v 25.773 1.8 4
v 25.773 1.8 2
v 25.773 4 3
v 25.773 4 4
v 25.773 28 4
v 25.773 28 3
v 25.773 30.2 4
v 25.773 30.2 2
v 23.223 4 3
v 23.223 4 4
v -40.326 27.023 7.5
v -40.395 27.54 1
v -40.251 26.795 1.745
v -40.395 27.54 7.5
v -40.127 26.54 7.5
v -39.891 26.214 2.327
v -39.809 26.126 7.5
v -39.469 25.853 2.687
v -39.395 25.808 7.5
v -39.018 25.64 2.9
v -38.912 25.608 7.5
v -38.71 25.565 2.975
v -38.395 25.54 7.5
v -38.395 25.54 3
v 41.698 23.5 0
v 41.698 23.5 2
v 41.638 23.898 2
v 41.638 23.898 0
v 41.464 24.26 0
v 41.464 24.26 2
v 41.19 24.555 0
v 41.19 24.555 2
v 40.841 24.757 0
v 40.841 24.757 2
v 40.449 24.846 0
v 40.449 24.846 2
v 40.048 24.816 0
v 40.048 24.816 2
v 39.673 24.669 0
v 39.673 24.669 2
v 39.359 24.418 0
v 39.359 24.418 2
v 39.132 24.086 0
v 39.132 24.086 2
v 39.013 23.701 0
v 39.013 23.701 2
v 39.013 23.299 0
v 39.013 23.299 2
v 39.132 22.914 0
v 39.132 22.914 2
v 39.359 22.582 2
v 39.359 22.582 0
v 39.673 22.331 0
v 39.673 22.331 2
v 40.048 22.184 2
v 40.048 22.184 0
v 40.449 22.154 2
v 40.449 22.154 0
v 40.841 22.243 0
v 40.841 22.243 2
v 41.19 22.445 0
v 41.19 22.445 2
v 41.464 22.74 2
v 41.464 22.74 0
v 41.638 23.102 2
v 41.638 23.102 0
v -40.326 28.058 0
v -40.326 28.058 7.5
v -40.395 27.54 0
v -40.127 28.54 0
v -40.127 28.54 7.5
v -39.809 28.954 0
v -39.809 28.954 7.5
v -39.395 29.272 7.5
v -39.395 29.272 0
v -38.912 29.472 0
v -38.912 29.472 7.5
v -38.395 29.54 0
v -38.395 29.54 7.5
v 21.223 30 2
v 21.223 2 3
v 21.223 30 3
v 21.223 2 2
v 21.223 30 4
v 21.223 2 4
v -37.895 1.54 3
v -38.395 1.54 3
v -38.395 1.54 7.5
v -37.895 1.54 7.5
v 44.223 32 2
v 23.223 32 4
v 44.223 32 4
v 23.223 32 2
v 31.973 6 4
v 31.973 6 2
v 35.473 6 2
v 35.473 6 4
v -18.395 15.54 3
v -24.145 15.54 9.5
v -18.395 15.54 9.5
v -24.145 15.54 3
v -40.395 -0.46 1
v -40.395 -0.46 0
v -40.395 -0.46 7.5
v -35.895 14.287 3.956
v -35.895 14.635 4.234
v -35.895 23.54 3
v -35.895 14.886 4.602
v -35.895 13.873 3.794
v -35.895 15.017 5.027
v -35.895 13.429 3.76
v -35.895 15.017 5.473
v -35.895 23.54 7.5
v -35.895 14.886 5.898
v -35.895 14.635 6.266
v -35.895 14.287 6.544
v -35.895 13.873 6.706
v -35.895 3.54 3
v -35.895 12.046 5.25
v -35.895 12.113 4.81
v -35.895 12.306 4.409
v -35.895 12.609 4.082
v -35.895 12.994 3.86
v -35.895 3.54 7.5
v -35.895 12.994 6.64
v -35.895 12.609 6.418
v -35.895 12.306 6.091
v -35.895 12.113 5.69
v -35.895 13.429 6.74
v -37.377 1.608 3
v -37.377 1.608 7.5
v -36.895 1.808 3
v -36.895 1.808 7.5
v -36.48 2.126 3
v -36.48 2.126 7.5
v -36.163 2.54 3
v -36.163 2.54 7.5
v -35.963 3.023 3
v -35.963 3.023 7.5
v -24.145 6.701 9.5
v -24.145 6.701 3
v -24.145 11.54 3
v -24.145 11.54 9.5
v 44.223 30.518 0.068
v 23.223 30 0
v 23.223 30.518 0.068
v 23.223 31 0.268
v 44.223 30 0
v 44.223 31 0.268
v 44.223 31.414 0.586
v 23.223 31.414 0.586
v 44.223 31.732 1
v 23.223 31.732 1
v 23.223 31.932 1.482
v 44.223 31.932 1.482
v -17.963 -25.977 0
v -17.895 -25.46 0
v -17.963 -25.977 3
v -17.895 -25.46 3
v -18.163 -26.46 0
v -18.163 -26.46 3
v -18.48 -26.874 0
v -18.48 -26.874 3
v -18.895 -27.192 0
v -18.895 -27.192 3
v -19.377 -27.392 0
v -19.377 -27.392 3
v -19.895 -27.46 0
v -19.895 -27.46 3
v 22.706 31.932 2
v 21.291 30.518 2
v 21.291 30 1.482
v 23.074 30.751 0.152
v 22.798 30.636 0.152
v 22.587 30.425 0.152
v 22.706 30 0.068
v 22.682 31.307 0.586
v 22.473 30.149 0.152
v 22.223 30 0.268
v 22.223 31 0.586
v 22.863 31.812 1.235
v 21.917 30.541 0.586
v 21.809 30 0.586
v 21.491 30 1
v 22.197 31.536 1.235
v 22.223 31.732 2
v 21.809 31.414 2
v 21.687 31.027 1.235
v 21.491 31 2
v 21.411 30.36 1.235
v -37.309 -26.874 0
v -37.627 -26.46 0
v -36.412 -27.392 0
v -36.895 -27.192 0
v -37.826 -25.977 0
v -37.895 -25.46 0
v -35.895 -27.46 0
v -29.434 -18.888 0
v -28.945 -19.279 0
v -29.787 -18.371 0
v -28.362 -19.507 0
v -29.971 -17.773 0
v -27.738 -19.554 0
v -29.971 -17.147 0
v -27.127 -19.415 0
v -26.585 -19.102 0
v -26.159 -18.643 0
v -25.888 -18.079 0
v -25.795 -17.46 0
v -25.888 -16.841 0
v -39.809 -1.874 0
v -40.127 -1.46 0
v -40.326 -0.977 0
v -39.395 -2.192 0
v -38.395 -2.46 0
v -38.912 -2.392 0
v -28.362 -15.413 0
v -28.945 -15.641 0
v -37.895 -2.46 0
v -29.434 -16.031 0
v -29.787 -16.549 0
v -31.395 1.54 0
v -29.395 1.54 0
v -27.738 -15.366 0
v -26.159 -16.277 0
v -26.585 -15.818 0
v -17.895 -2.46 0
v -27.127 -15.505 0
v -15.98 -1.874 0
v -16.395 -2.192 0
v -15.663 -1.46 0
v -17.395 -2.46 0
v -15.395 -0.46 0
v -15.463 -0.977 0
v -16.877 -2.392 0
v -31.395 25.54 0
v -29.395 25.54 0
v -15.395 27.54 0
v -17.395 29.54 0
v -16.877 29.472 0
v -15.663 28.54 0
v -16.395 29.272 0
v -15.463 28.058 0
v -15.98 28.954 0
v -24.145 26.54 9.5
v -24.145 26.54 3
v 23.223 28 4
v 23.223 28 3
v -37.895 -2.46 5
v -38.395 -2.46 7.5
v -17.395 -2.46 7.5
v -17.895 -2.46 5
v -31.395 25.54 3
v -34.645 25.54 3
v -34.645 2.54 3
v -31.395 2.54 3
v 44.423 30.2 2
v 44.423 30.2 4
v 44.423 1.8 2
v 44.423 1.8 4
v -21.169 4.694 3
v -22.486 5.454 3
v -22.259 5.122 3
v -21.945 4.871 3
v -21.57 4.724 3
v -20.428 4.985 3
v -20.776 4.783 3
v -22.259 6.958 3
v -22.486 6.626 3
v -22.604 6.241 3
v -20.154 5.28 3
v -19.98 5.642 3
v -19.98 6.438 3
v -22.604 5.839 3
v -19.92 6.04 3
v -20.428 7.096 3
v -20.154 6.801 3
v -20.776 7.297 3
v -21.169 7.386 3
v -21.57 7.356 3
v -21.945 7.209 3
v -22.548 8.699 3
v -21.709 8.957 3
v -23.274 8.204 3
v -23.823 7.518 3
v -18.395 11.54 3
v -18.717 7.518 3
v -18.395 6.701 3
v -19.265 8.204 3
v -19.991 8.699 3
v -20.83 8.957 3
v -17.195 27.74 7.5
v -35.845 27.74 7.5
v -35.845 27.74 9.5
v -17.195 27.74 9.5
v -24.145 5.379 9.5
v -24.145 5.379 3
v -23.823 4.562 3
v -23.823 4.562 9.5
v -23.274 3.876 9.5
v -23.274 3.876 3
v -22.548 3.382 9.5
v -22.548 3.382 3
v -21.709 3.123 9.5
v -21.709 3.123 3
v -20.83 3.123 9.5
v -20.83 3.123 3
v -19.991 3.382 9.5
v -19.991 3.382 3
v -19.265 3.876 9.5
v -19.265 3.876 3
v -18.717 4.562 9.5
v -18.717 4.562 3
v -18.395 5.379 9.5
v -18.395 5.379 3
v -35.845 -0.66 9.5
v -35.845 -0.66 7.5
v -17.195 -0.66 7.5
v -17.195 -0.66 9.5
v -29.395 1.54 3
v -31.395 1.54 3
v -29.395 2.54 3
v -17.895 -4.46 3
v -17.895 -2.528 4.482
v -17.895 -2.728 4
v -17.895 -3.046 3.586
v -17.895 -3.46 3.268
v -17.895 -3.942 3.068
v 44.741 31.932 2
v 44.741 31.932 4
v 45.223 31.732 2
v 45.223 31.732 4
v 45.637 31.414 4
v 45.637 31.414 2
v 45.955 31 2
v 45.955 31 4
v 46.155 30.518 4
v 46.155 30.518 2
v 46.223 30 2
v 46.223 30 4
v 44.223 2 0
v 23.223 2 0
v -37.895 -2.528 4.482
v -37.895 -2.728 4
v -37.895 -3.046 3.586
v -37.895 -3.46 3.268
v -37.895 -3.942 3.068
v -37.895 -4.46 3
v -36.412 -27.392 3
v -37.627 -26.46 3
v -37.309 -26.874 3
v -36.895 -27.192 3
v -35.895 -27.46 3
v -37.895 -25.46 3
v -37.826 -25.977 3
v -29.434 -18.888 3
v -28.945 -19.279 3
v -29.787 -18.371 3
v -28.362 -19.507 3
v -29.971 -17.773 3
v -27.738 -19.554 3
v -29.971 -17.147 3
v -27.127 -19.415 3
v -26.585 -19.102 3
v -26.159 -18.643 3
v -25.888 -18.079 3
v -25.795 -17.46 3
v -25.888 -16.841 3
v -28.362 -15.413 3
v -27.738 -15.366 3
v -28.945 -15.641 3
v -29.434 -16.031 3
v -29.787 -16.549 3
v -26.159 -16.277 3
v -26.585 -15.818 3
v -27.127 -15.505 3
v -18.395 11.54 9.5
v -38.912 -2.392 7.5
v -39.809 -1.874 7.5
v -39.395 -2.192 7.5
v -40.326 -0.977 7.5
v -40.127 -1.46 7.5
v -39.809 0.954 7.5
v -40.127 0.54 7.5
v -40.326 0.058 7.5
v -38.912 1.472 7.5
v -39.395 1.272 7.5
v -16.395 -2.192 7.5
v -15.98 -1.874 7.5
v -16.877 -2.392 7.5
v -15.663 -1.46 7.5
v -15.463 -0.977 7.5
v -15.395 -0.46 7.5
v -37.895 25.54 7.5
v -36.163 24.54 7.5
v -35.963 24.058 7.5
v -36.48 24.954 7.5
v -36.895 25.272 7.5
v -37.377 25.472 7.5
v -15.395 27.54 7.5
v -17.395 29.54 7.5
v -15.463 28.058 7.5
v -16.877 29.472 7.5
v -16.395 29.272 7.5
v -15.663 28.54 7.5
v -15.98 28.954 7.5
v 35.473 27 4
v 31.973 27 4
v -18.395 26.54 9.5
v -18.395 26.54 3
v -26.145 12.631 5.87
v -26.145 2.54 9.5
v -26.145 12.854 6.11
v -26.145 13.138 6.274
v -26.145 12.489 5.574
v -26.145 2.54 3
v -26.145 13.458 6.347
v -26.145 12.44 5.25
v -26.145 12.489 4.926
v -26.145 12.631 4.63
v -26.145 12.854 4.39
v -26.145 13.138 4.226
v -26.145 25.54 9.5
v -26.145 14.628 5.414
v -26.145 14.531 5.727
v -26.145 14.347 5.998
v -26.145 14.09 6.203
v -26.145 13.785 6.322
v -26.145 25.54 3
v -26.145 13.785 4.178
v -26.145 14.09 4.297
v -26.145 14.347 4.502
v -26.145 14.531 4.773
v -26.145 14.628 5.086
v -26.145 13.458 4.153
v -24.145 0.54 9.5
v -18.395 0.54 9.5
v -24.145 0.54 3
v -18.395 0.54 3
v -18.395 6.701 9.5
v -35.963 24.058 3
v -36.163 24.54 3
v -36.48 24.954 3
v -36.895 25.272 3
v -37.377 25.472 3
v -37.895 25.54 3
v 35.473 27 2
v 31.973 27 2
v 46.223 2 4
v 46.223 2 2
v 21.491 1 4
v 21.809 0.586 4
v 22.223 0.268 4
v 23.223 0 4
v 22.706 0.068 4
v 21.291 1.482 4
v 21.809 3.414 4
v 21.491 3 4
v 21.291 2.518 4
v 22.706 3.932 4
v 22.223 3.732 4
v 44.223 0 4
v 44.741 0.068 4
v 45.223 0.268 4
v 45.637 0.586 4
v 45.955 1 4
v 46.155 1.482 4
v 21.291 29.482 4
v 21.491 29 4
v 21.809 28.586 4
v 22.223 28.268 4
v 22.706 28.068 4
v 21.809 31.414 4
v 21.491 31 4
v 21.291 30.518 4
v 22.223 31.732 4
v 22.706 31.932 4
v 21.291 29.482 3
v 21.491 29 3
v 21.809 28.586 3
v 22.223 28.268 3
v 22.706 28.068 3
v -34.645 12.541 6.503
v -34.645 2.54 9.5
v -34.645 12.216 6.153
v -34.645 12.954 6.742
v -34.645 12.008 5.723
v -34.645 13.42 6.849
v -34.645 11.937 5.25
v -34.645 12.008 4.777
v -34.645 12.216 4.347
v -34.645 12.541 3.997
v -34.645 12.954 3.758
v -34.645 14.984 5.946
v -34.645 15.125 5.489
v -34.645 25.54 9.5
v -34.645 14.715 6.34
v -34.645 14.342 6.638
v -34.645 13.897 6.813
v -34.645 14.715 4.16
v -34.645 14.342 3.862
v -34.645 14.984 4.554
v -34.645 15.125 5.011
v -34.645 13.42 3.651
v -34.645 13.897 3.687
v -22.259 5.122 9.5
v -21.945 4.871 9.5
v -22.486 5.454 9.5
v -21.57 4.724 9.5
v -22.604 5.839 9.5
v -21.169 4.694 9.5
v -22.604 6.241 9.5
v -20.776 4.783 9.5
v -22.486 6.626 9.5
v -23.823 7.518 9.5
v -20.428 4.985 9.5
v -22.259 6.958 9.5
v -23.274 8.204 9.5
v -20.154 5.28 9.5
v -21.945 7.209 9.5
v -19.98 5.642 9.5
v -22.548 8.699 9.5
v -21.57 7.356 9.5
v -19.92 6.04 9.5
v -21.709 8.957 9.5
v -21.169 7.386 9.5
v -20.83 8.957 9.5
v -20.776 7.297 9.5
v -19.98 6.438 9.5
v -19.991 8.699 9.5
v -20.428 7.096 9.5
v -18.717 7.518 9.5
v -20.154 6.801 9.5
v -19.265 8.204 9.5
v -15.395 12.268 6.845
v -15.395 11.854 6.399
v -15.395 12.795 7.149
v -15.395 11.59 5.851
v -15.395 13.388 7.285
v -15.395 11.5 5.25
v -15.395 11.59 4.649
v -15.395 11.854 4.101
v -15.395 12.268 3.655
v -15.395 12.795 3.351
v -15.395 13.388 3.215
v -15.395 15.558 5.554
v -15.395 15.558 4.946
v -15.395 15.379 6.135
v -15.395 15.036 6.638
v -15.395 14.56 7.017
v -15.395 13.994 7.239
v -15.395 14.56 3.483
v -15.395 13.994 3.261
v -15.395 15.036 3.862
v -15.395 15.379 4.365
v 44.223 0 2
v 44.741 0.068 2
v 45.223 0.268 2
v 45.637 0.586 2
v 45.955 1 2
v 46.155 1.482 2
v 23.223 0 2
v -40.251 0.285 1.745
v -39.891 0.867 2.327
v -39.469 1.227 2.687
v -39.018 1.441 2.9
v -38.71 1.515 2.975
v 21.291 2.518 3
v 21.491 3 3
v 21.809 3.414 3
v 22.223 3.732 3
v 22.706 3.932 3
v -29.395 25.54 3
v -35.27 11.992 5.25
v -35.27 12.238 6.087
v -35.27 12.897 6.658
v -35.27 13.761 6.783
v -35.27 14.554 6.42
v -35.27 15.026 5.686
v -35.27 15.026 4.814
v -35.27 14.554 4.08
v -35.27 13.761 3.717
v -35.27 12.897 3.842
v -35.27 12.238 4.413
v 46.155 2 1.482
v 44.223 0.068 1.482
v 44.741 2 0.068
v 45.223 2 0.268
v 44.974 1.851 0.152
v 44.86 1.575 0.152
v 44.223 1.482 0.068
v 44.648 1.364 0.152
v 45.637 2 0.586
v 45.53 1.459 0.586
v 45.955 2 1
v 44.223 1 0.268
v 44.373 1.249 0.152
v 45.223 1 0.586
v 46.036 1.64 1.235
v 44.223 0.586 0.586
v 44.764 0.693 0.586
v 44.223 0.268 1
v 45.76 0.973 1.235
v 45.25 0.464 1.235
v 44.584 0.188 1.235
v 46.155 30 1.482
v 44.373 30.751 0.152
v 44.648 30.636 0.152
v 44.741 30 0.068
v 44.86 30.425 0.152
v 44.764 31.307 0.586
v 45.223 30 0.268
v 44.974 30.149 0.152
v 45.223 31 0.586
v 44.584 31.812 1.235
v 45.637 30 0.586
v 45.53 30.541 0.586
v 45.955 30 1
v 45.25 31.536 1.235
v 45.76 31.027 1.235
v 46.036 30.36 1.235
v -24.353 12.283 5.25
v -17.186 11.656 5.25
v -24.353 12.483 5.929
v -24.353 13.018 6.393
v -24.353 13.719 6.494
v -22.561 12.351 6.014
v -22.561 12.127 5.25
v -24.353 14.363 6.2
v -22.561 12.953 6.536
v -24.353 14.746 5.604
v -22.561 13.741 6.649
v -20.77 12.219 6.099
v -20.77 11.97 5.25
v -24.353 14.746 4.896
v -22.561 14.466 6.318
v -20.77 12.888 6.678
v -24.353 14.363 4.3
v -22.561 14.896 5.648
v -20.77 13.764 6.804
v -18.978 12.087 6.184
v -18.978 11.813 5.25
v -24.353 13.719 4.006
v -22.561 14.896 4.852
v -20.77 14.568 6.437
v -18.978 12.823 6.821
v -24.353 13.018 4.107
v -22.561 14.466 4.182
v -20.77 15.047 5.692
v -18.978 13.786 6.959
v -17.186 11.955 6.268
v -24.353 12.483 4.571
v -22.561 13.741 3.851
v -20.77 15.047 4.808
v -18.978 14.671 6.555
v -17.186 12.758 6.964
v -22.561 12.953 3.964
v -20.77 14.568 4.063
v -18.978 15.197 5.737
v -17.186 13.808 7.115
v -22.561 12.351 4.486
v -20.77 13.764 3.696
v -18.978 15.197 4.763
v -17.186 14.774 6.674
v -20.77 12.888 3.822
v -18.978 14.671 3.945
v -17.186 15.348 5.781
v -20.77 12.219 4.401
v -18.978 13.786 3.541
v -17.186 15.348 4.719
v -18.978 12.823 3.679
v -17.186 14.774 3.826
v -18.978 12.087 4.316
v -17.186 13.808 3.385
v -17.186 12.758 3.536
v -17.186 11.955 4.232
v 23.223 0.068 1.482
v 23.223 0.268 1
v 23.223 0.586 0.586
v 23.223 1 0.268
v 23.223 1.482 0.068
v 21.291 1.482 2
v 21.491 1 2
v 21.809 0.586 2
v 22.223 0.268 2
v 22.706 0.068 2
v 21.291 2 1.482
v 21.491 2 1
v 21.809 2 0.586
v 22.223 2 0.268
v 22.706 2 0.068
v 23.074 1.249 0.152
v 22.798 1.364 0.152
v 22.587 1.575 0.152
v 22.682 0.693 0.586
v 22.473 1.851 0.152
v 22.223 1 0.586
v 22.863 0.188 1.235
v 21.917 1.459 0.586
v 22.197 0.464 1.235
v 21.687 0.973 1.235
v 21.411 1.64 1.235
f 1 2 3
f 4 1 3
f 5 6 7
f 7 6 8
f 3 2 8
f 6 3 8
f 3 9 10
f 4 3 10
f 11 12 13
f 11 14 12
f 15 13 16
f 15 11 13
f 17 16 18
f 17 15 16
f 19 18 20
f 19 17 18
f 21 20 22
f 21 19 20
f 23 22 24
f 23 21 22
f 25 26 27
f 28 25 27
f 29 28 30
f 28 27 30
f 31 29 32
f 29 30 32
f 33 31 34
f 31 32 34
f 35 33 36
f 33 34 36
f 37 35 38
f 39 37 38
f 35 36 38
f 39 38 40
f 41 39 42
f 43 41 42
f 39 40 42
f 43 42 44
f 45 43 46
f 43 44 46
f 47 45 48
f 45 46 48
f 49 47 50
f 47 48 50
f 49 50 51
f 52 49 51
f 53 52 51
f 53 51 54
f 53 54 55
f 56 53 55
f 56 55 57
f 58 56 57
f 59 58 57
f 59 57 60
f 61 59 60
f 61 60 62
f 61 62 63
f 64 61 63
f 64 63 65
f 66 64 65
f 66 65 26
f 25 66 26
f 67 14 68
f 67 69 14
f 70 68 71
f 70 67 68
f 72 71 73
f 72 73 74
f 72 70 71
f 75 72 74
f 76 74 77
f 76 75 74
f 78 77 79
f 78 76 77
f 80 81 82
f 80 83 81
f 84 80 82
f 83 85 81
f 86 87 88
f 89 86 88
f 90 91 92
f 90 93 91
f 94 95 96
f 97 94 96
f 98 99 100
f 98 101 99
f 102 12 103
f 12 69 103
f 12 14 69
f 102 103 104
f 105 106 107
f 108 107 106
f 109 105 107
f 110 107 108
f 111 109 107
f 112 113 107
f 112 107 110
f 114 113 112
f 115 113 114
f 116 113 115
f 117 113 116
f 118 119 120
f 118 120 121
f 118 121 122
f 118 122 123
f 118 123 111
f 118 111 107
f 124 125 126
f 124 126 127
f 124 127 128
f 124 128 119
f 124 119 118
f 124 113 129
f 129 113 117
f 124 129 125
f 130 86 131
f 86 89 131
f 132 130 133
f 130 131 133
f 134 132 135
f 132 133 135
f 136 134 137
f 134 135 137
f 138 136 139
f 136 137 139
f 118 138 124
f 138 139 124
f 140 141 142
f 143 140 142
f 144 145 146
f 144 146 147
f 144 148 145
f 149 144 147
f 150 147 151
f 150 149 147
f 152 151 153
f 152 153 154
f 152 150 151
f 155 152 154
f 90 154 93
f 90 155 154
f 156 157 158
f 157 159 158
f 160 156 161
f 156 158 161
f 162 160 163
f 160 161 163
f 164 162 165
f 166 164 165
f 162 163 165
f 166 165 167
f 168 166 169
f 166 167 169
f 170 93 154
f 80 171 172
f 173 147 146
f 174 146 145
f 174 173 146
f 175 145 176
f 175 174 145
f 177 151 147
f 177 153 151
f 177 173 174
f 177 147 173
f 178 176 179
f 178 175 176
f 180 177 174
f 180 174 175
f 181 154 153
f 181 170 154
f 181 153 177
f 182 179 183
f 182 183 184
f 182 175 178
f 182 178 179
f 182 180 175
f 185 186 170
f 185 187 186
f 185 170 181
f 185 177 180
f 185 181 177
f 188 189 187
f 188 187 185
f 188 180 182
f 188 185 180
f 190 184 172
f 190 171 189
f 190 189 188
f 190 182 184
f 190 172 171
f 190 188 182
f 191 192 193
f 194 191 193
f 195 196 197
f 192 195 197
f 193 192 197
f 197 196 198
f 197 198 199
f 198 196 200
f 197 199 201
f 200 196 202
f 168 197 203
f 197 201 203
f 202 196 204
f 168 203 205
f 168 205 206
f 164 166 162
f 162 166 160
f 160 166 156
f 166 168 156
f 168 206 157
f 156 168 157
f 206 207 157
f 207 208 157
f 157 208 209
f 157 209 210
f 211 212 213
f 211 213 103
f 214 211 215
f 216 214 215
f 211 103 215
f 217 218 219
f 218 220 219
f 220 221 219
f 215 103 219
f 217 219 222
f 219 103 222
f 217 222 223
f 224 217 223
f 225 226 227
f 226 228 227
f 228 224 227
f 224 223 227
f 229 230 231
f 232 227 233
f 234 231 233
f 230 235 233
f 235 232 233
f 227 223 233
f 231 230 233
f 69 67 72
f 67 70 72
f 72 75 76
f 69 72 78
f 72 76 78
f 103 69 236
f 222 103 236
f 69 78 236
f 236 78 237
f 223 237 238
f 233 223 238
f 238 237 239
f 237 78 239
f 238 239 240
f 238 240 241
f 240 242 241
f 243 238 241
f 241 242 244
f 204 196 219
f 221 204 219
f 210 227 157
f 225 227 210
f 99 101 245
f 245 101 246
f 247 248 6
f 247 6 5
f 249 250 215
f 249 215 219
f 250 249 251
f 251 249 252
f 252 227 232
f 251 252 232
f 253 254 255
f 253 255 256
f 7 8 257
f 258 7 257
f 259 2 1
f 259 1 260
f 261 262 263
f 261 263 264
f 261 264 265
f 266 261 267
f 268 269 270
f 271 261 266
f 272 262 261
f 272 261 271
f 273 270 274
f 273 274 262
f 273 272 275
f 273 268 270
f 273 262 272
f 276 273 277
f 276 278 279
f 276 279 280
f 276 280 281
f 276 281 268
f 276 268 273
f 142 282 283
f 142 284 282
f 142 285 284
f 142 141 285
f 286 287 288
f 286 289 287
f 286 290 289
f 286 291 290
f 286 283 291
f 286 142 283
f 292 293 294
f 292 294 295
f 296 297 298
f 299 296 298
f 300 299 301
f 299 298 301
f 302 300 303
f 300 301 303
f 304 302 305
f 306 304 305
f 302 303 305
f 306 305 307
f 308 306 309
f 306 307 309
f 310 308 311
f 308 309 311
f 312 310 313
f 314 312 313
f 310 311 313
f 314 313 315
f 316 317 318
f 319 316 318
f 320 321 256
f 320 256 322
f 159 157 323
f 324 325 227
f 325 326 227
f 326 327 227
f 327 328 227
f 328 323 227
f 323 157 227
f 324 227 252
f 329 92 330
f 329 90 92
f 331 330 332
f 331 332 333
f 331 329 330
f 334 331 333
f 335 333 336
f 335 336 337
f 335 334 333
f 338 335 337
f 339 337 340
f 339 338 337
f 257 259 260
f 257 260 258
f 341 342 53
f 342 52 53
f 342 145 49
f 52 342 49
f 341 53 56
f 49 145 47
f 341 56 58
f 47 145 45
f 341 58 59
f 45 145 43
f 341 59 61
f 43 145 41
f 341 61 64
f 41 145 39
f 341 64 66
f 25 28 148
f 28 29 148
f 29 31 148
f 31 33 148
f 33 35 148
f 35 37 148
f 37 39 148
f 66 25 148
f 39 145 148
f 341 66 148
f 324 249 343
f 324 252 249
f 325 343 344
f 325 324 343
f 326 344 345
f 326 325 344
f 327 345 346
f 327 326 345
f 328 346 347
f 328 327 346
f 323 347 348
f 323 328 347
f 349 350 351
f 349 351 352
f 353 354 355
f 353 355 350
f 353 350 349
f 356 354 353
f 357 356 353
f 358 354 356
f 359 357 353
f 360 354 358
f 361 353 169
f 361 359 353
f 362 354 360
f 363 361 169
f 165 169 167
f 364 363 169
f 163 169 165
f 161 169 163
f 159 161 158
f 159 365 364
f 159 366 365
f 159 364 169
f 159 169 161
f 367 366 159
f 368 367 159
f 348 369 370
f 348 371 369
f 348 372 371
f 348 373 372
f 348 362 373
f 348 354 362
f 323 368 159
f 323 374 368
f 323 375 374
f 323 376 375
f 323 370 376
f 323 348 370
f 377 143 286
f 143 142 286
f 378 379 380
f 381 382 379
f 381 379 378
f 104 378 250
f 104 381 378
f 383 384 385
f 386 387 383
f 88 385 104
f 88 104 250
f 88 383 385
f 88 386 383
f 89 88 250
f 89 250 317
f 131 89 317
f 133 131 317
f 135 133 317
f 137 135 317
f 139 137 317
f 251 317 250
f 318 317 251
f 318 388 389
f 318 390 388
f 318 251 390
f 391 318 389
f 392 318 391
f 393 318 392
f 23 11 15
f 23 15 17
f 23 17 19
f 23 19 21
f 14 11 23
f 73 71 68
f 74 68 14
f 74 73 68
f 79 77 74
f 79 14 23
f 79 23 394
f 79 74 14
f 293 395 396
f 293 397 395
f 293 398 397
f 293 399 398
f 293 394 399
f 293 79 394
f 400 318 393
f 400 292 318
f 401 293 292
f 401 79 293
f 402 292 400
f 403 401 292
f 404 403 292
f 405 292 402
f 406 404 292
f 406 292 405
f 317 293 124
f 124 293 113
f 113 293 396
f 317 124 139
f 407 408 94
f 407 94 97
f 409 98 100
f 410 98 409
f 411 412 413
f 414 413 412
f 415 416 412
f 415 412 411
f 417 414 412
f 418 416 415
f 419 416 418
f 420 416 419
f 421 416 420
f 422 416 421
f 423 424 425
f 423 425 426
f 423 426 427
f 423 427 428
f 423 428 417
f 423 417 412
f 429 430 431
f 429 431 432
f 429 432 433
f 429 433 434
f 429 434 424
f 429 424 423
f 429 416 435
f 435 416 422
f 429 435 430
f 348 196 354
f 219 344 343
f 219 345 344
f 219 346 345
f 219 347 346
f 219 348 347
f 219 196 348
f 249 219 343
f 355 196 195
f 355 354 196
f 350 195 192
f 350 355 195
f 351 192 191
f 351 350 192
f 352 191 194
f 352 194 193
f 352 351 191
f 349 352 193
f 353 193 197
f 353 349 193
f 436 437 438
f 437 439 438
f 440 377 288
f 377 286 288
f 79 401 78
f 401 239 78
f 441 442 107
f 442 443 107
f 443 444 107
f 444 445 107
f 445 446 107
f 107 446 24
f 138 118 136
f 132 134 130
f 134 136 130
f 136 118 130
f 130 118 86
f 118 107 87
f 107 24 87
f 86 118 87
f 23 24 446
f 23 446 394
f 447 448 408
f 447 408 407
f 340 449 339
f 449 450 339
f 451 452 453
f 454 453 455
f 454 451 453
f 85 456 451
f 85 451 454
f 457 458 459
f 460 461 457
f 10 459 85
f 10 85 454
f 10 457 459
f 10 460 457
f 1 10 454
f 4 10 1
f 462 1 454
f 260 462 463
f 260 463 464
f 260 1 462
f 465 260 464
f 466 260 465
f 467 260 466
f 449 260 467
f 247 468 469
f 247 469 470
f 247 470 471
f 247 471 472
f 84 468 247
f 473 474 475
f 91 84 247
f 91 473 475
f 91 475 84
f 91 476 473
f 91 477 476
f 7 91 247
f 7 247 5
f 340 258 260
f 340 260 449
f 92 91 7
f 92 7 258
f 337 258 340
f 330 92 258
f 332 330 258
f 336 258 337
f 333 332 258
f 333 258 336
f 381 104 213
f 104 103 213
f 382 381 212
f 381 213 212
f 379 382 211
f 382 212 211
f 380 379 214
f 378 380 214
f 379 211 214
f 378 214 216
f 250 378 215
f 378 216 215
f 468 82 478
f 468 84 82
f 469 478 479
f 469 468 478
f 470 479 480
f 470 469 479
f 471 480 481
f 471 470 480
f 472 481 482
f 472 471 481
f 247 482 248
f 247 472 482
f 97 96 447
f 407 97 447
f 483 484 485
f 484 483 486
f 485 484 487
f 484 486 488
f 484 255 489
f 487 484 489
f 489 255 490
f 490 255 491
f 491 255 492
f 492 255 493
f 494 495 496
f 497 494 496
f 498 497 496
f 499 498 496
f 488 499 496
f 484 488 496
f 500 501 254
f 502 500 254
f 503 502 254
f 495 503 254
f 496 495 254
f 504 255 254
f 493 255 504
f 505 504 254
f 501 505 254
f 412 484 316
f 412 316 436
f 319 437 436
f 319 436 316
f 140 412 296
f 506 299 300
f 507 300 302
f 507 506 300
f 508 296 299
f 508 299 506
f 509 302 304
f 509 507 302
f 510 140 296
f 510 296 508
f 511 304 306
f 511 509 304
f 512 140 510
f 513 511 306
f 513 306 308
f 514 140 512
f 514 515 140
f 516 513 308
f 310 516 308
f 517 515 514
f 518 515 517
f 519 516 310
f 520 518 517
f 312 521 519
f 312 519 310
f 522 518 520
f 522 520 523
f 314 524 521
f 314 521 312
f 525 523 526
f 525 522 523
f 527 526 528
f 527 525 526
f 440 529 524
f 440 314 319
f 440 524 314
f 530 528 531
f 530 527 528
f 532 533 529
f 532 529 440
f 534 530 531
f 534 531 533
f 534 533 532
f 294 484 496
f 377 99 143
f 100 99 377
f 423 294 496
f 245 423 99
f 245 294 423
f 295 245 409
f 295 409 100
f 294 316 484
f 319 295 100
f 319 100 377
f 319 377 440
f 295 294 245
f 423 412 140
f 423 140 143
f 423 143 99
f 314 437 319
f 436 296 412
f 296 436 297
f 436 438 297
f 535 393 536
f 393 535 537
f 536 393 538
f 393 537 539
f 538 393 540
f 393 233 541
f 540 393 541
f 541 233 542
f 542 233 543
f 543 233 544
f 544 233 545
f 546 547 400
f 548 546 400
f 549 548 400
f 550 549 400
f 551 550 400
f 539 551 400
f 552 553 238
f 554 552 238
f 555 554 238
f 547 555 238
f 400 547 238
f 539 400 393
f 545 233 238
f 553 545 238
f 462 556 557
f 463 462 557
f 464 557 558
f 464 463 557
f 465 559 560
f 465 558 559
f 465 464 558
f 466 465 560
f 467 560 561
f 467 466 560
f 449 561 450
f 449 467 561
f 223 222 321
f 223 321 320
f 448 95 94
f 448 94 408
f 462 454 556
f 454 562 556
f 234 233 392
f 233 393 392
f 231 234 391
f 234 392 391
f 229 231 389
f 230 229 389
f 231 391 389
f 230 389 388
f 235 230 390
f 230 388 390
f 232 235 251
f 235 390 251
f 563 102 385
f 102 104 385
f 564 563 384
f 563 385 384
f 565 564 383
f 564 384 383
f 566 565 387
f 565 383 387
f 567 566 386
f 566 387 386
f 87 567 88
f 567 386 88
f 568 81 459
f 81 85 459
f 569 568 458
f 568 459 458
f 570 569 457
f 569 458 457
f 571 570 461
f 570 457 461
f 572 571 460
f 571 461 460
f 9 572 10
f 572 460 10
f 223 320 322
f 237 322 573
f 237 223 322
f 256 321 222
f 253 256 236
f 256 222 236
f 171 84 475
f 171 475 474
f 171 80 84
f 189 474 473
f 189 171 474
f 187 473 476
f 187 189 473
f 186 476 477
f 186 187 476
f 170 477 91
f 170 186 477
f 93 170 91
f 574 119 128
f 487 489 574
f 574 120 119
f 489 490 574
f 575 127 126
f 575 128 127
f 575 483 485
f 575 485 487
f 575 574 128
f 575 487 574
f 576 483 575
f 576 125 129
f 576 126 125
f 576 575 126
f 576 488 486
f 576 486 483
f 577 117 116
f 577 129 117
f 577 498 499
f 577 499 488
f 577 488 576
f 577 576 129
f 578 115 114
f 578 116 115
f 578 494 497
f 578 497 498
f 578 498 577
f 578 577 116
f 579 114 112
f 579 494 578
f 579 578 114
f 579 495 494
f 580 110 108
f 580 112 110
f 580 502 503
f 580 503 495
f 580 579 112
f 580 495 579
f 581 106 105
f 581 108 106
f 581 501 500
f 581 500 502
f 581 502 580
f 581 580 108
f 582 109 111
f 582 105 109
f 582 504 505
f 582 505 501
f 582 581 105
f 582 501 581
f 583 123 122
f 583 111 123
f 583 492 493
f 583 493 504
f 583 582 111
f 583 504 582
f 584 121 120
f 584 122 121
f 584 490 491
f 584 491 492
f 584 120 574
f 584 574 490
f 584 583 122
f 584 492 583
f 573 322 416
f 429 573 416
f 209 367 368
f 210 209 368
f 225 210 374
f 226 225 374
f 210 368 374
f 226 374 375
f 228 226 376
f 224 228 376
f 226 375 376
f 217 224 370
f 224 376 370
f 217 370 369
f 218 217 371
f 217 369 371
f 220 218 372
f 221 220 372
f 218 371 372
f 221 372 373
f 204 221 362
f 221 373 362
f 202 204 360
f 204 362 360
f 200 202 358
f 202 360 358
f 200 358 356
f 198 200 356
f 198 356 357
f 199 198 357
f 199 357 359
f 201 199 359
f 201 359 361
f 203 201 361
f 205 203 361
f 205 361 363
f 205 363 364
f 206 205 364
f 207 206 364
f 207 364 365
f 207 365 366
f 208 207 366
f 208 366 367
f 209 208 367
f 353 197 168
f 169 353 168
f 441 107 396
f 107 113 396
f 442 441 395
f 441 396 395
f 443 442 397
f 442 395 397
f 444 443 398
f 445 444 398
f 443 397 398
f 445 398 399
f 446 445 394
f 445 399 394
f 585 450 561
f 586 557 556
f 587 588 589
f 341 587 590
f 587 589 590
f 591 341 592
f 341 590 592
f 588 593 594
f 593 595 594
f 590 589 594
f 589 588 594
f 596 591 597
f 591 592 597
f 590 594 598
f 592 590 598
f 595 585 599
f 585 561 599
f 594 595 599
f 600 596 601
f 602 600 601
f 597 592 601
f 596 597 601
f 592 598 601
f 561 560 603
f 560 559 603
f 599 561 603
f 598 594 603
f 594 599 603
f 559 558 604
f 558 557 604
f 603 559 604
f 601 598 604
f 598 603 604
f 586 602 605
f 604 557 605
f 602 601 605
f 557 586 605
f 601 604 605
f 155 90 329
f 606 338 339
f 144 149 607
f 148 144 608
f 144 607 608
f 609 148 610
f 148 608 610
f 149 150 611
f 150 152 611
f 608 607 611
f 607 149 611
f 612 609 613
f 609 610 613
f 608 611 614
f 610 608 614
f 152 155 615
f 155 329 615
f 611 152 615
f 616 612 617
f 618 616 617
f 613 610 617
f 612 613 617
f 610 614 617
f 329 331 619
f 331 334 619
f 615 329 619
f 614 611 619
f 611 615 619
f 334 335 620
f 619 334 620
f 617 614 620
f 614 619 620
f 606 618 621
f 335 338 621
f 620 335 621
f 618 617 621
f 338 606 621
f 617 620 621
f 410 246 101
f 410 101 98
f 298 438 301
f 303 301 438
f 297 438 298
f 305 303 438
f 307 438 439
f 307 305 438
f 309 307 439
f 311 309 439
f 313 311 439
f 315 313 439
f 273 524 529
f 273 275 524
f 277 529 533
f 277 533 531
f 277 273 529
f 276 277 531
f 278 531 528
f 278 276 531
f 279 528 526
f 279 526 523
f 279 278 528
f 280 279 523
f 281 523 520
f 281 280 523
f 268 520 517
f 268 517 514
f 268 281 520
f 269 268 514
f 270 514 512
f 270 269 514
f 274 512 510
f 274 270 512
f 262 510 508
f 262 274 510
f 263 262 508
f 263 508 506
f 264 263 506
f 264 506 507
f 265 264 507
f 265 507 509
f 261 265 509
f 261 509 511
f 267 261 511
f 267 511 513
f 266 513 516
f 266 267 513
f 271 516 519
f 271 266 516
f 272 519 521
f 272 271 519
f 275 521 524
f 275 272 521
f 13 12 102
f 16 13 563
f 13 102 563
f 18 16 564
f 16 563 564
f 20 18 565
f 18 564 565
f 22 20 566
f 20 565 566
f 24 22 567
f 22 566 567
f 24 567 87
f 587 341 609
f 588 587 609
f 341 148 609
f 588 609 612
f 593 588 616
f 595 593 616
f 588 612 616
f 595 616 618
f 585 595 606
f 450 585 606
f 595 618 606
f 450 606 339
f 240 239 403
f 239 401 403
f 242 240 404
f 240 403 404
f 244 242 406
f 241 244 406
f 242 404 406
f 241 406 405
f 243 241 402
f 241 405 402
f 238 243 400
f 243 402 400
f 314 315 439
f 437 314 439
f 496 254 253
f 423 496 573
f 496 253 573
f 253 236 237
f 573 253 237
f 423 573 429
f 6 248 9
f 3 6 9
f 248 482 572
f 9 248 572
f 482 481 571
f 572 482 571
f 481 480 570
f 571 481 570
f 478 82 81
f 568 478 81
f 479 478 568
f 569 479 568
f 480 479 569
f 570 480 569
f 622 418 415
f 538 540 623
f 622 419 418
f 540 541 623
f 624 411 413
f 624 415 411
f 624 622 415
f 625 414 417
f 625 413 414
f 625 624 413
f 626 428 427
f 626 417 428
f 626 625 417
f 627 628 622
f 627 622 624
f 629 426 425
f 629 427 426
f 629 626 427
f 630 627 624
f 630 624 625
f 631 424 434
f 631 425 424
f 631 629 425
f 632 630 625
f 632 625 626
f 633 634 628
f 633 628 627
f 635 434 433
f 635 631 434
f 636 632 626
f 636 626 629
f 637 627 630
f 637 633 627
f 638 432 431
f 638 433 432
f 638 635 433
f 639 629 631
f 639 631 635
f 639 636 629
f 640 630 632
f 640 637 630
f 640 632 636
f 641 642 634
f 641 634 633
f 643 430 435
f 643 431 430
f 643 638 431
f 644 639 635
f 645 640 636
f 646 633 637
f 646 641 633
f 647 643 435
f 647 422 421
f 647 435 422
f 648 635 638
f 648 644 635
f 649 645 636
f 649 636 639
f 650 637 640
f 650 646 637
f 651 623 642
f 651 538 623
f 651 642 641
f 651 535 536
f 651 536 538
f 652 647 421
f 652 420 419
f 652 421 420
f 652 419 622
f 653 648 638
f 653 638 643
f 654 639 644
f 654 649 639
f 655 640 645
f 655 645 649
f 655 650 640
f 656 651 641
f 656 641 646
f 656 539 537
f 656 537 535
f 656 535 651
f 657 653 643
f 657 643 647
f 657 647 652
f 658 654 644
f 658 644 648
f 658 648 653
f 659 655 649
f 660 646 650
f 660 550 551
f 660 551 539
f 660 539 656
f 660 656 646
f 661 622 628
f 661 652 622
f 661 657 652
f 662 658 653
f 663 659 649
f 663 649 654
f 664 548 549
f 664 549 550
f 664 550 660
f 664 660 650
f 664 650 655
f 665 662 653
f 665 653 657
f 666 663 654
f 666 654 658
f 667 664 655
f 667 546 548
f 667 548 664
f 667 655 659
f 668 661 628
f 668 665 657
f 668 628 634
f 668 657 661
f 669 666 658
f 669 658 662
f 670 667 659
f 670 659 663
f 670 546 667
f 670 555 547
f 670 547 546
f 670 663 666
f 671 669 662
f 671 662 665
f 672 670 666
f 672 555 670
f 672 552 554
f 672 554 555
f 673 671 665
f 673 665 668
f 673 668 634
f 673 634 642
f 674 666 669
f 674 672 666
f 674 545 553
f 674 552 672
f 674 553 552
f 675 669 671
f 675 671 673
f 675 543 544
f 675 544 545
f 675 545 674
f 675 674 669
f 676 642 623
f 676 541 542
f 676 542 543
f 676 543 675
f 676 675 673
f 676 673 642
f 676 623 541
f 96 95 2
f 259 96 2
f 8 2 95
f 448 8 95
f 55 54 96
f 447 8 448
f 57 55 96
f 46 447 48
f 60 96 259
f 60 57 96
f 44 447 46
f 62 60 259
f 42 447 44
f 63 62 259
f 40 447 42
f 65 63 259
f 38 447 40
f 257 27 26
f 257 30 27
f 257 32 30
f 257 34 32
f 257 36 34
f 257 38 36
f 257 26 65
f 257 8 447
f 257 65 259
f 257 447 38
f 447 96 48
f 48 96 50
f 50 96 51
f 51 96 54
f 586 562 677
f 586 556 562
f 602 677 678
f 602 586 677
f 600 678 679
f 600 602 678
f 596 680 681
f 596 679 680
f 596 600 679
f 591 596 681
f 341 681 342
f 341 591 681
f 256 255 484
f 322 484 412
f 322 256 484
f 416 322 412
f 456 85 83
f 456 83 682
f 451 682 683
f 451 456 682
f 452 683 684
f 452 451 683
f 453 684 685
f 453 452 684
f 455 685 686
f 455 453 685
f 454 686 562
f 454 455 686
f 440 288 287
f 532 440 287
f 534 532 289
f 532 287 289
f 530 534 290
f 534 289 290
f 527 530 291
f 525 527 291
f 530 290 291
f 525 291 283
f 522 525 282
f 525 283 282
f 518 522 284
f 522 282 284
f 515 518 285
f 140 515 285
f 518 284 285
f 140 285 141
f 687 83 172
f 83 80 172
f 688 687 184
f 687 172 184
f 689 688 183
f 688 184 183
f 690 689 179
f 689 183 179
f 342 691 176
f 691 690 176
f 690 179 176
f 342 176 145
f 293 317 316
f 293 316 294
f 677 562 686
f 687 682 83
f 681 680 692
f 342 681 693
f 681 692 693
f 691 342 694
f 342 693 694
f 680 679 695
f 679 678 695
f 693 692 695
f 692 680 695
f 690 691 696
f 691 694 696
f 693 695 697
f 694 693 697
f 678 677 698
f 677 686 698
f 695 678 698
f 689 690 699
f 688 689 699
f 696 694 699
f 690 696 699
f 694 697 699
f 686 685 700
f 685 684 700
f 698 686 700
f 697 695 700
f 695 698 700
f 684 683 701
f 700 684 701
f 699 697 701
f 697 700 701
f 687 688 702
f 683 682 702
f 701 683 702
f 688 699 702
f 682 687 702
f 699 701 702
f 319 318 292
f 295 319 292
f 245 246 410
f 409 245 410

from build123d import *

# Parameters (mm, degrees)
F0_W      = 2
F0_H      = 24
F0_W_2    = 20
F0_H_2    = 25
F1_DEPTH  = 3
F2_W      = 8.5
F2_H      = 26
F2_R      = 1.35
F2_W_2    = 5.75
F2_H_2    = 4
F3_DEPTH  = 4.5
F2_R_2    = 2.1
F4_DEPTH  = 25
F5_W      = 18.65
F5_H      = 28.4
F5_R      = 1.35
F5_W_2    = 8.5
F5_H_2    = 26
F5_W_3    = 5.75
F5_H_3    = 11
F6_DEPTH  = 2
F8_R      = 1.1
F7_R      = 1.1
F9_DEPTH  = 11
F9_TAPER  = -5
F8_W      = 24
F8_H      = 4.5
F10_DEPTH = 4.5
F11_W     = 25
F11_H     = 32
F12_DEPTH = 2
F13_W     = 25
F13_H     = 32
F13_W_2   = 18.65
F13_H_2   = 28.4
F14_DEPTH = 2
F15_W     = 3.5
F15_H     = 26
F16_DEPTH = 2
F15_R     = 1.35
F17_DEPTH = 25
F18_W     = 24
F18_H     = 1
F19_DEPTH = 4.6
F20_R     = 1.99999
F20_2_R   = 1.99999
F21_DEPTH = 2
F22_DEPTH = 1
F23_DEPTH = 3
F24_DEPTH = 2


# Not quite as in the source:
# - a fillet or chamfer is up to 0.001 mm smaller than in the source, because OpenCascade refuses the exact size
# - a feature names something its author has since deleted; it is built from what else it names


with BuildPart() as f1:
    # F0 (on Top) → F1 (new body)
    with BuildSketch(Plane.XY):
        Polygon((-15.3945611045, 29.5401477255), (-40.3945611045, 29.5401477255), (-40.3945611045, -2.4598522745), (-37.8945611045, -2.4598522745), (-17.8945611045, -2.4598522745), (-15.3945611045, -2.4598522745), align=None)
        with Locations((-30.3945611045, 13.5401477255)):
            Rectangle(F0_W, F0_H, mode=Mode.SUBTRACT)
        with Locations((-27.8945611045, -14.9598522745)):
            Rectangle(F0_W_2, F0_H_2)
    extrude(amount=F1_DEPTH)

    # F2 (on face) → F3 (join)
    with BuildSketch(Plane.XY.offset(3)):
        Polygon((-40.3945611045, -2.4598522745), (-37.8945611045, -2.4598522745), (-17.8945611045, -2.4598522745), (-15.3945611045, -2.4598522745), (-15.3945611045, 29.5401477255), (-40.3945611045, 29.5401477255), align=None)
        with Locations((-30.3945611045, 13.5401477255)):
            Rectangle(F2_W, F2_H, mode=Mode.SUBTRACT)
        with BuildLine():
            Line((-18.3945611045, 0.5401477255), (-24.1445611045, 0.5401477255))
            Line((-24.1445611045, 0.5401477255), (-24.1445611045, 5.3791825222))
            ThreePointArc((-24.1445611045, 5.3791825222), (-21.2695611045, 3.0901477255), (-18.3945611045, 5.3791825222))
            Line((-18.3945611045, 5.3791825222), (-18.3945611045, 0.5401477255))
        make_face(mode=Mode.SUBTRACT)
        with Locations((-21.2695611045, 6.0401477255)):
            Circle(F2_R, mode=Mode.SUBTRACT)
        with BuildLine():
            Line((-24.1445611045, 26.5401477255), (-18.3945611045, 26.5401477255))
            Line((-18.3945611045, 26.5401477255), (-18.3945611045, 15.5401477255))
            Line((-18.3945611045, 15.5401477255), (-18.3945611045, 11.5401477255))
            Line((-18.3945611045, 11.5401477255), (-18.3945611045, 6.7011129288))
            ThreePointArc((-18.3945611045, 6.7011129288), (-21.2695611045, 8.9901477255), (-24.1445611045, 6.7011129288))
            Line((-24.1445611045, 6.7011129288), (-24.1445611045, 11.5401477255))
            Line((-24.1445611045, 11.5401477255), (-24.1445611045, 15.5401477255))
            Line((-24.1445611045, 15.5401477255), (-24.1445611045, 26.5401477255))
        make_face(mode=Mode.SUBTRACT)
        with Locations((-21.2695611045, 13.5401477255)):
            Rectangle(F2_W_2, F2_H_2)
    extrude(amount=F3_DEPTH)

    # F2 (on face) → F4 (cut)
    with BuildSketch(Plane.XY.offset(3)):
        with Locations((-27.8945611045, -17.4598522745)):
            Circle(F2_R_2)
    extrude(amount=-F4_DEPTH, mode=Mode.SUBTRACT)

    # F5 (on face) → F6 (join)
    with BuildSketch(Plane.XY.offset(7.5)):
        with Locations((-26.5195611045, 13.5401477255)):
            Rectangle(F5_W, F5_H)
        with BuildLine():
            Line((-18.3945611045, 0.5401477255), (-24.1445611045, 0.5401477255))
            Line((-24.1445611045, 0.5401477255), (-24.1445611045, 5.3791825222))
            ThreePointArc((-24.1445611045, 5.3791825222), (-21.2695611045, 3.0901477255), (-18.3945611045, 5.3791825222))
            Line((-18.3945611045, 5.3791825222), (-18.3945611045, 0.5401477255))
        make_face(mode=Mode.SUBTRACT)
        with Locations((-21.2695611045, 6.0401477255)):
            Circle(F5_R, mode=Mode.SUBTRACT)
        with BuildLine():
            Line((-24.1445611045, 11.5401477255), (-18.3945611045, 11.5401477255))
            Line((-18.3945611045, 11.5401477255), (-18.3945611045, 6.7011129288))
            ThreePointArc((-18.3945611045, 6.7011129288), (-21.2695611045, 8.9901477255), (-24.1445611045, 6.7011129288))
            Line((-24.1445611045, 6.7011129288), (-24.1445611045, 11.5401477255))
        make_face(mode=Mode.SUBTRACT)
        with Locations((-30.3945611045, 13.5401477255)):
            Rectangle(F5_W_2, F5_H_2, mode=Mode.SUBTRACT)
        with Locations((-21.2695611045, 21.0401477255)):
            Rectangle(F5_W_3, F5_H_3, mode=Mode.SUBTRACT)
    extrude(amount=F6_DEPTH)

    # F8 (on face) + F7 (on face) → F9 (cut)
    with BuildSketch(Plane(origin=(-40.3945611045, 0, 0), x_dir=(0, -1, 0), z_dir=(-1, 0, 0))):
        with Locations((-13.5401477255, 5.25)):
            Circle(F8_R)
    with BuildSketch(Plane(origin=(-26.1445611045, 0, 0), x_dir=(0, -1, 0), z_dir=(-1, 0, 0))):
        with Locations((-13.5401477255, 5.25)):
            Circle(F7_R)
    extrude(amount=-F9_DEPTH, taper=F9_TAPER, mode=Mode.SUBTRACT)

    # F8 (on face) → F10 (cut)
    with BuildSketch(Plane(origin=(-40.3945611045, 0, 0), x_dir=(0, -1, 0), z_dir=(-1, 0, 0))):
        with Locations((-13.5401477255, 5.25)):
            Rectangle(F8_W, F8_H)
        with Locations((-13.5401477255, 5.25)):
            Circle(F8_R, mode=Mode.SUBTRACT)
    extrude(amount=-F10_DEPTH, mode=Mode.SUBTRACT)

    # F20 (radius 2 in the source; OpenCascade refuses exactly that, so slightly less here)
    f20_edges = [f1.edges().sort_by_distance(p)[0] for p in [
        (-40.394561, 29.540148, 3.75),
        (-40.394561, -2.459852, 3.75),
        (-40.394561, 13.540148, 3),
        (-40.394561, 1.540148, 5.25),
        (-15.394561, 29.540148, 3.75),
        (-15.394561, -2.459852, 3.75),
        (-27.894561, -2.459852, 3),
        (-17.894561, -27.459852, 1.5),
        (-37.894561, -27.459852, 1.5),
        (-40.394561, 25.540148, 5.25),
        (-35.894561, 1.540148, 5.25),
        (-35.894561, 25.540148, 5.25),
    ]]
    fillet(f20_edges, radius=F20_R)

    # F21 (add): a face of the model
    f21_faces = [f1.faces().sort_by_distance(p)[0] for p in [
        (-30.3945611045, 0.5401477255, 6.25),
    ]]
    extrude(f21_faces, amount=F21_DEPTH)

    # F22 (add): a face of the model
    f22_faces = [f1.faces().sort_by_distance(p)[0] for p in [
        (-30.3945611045, 26.5401477255, 6.25),
    ]]
    extrude(f22_faces, amount=F22_DEPTH)


with BuildPart() as f12:
    # F11 (on Top) → F12 (new body)
    with BuildSketch(Plane.XY):
        with Locations((33.7232563645, 16)):
            Rectangle(F11_W, F11_H)
    extrude(amount=F12_DEPTH)

    # F13 (on face) → F14 (join)
    with BuildSketch(Plane.XY.offset(2)):
        with Locations((33.7232563645, 16)):
            Rectangle(F13_W, F13_H)
        with Locations((35.0982563645, 16)):
            Rectangle(F13_W_2, F13_H_2, mode=Mode.SUBTRACT)
    extrude(amount=F14_DEPTH)

    # F15 (on face) → F16 (join)
    with BuildSketch(Plane.XY.offset(2)):
        with Locations((33.7232563645, 16)):
            Rectangle(F15_W, F15_H)
    extrude(amount=F16_DEPTH)

    # F15 (on face) → F17 (cut)
    with BuildSketch(Plane.XY.offset(2)):
        with Locations((40.3482563645, 23.5)):
            Circle(F15_R)
    extrude(amount=-F17_DEPTH, mode=Mode.SUBTRACT)

    # F18 (on face) → F19 (cut)
    with BuildSketch(Plane(origin=(21.2232563645, 0, 0), x_dir=(0, -1, 0), z_dir=(-1, 0, 0))):
        with Locations((-16, 3.5)):
            Rectangle(F18_W, F18_H)
    extrude(amount=-F19_DEPTH, mode=Mode.SUBTRACT)

    # F20#2 (radius 2 in the source; OpenCascade refuses exactly that, so slightly less here)
    f20_2_edges = [f12.edges().sort_by_distance(p)[0] for p in [
        (21.223256, 0, 2),
        (21.223256, 32, 2),
        (21.223256, 28, 3.5),
        (21.223256, 4, 3.5),
        (46.223256, 0, 2),
        (46.223256, 32, 2),
        (33.723256, 32, 0),
        (46.223256, 16, 0),
        (33.723256, 0, 0),
        (21.223256, 16, 0),
    ]]
    fillet(f20_2_edges, radius=F20_2_R)

    # F23 (cut): a face of the model
    f23_faces = [f12.faces().sort_by_distance(p)[0] for p in [
        (33.7232563645, 3, 3),
    ]]
    extrude(f23_faces, amount=-F23_DEPTH, mode=Mode.SUBTRACT)

    # F24 (cut): a face of the model
    f24_faces = [f12.faces().sort_by_distance(p)[0] for p in [
        (33.7232563645, 29, 3),
    ]]
    extrude(f24_faces, amount=-F24_DEPTH, mode=Mode.SUBTRACT)


solid = Compound([f1.part, f12.part])
